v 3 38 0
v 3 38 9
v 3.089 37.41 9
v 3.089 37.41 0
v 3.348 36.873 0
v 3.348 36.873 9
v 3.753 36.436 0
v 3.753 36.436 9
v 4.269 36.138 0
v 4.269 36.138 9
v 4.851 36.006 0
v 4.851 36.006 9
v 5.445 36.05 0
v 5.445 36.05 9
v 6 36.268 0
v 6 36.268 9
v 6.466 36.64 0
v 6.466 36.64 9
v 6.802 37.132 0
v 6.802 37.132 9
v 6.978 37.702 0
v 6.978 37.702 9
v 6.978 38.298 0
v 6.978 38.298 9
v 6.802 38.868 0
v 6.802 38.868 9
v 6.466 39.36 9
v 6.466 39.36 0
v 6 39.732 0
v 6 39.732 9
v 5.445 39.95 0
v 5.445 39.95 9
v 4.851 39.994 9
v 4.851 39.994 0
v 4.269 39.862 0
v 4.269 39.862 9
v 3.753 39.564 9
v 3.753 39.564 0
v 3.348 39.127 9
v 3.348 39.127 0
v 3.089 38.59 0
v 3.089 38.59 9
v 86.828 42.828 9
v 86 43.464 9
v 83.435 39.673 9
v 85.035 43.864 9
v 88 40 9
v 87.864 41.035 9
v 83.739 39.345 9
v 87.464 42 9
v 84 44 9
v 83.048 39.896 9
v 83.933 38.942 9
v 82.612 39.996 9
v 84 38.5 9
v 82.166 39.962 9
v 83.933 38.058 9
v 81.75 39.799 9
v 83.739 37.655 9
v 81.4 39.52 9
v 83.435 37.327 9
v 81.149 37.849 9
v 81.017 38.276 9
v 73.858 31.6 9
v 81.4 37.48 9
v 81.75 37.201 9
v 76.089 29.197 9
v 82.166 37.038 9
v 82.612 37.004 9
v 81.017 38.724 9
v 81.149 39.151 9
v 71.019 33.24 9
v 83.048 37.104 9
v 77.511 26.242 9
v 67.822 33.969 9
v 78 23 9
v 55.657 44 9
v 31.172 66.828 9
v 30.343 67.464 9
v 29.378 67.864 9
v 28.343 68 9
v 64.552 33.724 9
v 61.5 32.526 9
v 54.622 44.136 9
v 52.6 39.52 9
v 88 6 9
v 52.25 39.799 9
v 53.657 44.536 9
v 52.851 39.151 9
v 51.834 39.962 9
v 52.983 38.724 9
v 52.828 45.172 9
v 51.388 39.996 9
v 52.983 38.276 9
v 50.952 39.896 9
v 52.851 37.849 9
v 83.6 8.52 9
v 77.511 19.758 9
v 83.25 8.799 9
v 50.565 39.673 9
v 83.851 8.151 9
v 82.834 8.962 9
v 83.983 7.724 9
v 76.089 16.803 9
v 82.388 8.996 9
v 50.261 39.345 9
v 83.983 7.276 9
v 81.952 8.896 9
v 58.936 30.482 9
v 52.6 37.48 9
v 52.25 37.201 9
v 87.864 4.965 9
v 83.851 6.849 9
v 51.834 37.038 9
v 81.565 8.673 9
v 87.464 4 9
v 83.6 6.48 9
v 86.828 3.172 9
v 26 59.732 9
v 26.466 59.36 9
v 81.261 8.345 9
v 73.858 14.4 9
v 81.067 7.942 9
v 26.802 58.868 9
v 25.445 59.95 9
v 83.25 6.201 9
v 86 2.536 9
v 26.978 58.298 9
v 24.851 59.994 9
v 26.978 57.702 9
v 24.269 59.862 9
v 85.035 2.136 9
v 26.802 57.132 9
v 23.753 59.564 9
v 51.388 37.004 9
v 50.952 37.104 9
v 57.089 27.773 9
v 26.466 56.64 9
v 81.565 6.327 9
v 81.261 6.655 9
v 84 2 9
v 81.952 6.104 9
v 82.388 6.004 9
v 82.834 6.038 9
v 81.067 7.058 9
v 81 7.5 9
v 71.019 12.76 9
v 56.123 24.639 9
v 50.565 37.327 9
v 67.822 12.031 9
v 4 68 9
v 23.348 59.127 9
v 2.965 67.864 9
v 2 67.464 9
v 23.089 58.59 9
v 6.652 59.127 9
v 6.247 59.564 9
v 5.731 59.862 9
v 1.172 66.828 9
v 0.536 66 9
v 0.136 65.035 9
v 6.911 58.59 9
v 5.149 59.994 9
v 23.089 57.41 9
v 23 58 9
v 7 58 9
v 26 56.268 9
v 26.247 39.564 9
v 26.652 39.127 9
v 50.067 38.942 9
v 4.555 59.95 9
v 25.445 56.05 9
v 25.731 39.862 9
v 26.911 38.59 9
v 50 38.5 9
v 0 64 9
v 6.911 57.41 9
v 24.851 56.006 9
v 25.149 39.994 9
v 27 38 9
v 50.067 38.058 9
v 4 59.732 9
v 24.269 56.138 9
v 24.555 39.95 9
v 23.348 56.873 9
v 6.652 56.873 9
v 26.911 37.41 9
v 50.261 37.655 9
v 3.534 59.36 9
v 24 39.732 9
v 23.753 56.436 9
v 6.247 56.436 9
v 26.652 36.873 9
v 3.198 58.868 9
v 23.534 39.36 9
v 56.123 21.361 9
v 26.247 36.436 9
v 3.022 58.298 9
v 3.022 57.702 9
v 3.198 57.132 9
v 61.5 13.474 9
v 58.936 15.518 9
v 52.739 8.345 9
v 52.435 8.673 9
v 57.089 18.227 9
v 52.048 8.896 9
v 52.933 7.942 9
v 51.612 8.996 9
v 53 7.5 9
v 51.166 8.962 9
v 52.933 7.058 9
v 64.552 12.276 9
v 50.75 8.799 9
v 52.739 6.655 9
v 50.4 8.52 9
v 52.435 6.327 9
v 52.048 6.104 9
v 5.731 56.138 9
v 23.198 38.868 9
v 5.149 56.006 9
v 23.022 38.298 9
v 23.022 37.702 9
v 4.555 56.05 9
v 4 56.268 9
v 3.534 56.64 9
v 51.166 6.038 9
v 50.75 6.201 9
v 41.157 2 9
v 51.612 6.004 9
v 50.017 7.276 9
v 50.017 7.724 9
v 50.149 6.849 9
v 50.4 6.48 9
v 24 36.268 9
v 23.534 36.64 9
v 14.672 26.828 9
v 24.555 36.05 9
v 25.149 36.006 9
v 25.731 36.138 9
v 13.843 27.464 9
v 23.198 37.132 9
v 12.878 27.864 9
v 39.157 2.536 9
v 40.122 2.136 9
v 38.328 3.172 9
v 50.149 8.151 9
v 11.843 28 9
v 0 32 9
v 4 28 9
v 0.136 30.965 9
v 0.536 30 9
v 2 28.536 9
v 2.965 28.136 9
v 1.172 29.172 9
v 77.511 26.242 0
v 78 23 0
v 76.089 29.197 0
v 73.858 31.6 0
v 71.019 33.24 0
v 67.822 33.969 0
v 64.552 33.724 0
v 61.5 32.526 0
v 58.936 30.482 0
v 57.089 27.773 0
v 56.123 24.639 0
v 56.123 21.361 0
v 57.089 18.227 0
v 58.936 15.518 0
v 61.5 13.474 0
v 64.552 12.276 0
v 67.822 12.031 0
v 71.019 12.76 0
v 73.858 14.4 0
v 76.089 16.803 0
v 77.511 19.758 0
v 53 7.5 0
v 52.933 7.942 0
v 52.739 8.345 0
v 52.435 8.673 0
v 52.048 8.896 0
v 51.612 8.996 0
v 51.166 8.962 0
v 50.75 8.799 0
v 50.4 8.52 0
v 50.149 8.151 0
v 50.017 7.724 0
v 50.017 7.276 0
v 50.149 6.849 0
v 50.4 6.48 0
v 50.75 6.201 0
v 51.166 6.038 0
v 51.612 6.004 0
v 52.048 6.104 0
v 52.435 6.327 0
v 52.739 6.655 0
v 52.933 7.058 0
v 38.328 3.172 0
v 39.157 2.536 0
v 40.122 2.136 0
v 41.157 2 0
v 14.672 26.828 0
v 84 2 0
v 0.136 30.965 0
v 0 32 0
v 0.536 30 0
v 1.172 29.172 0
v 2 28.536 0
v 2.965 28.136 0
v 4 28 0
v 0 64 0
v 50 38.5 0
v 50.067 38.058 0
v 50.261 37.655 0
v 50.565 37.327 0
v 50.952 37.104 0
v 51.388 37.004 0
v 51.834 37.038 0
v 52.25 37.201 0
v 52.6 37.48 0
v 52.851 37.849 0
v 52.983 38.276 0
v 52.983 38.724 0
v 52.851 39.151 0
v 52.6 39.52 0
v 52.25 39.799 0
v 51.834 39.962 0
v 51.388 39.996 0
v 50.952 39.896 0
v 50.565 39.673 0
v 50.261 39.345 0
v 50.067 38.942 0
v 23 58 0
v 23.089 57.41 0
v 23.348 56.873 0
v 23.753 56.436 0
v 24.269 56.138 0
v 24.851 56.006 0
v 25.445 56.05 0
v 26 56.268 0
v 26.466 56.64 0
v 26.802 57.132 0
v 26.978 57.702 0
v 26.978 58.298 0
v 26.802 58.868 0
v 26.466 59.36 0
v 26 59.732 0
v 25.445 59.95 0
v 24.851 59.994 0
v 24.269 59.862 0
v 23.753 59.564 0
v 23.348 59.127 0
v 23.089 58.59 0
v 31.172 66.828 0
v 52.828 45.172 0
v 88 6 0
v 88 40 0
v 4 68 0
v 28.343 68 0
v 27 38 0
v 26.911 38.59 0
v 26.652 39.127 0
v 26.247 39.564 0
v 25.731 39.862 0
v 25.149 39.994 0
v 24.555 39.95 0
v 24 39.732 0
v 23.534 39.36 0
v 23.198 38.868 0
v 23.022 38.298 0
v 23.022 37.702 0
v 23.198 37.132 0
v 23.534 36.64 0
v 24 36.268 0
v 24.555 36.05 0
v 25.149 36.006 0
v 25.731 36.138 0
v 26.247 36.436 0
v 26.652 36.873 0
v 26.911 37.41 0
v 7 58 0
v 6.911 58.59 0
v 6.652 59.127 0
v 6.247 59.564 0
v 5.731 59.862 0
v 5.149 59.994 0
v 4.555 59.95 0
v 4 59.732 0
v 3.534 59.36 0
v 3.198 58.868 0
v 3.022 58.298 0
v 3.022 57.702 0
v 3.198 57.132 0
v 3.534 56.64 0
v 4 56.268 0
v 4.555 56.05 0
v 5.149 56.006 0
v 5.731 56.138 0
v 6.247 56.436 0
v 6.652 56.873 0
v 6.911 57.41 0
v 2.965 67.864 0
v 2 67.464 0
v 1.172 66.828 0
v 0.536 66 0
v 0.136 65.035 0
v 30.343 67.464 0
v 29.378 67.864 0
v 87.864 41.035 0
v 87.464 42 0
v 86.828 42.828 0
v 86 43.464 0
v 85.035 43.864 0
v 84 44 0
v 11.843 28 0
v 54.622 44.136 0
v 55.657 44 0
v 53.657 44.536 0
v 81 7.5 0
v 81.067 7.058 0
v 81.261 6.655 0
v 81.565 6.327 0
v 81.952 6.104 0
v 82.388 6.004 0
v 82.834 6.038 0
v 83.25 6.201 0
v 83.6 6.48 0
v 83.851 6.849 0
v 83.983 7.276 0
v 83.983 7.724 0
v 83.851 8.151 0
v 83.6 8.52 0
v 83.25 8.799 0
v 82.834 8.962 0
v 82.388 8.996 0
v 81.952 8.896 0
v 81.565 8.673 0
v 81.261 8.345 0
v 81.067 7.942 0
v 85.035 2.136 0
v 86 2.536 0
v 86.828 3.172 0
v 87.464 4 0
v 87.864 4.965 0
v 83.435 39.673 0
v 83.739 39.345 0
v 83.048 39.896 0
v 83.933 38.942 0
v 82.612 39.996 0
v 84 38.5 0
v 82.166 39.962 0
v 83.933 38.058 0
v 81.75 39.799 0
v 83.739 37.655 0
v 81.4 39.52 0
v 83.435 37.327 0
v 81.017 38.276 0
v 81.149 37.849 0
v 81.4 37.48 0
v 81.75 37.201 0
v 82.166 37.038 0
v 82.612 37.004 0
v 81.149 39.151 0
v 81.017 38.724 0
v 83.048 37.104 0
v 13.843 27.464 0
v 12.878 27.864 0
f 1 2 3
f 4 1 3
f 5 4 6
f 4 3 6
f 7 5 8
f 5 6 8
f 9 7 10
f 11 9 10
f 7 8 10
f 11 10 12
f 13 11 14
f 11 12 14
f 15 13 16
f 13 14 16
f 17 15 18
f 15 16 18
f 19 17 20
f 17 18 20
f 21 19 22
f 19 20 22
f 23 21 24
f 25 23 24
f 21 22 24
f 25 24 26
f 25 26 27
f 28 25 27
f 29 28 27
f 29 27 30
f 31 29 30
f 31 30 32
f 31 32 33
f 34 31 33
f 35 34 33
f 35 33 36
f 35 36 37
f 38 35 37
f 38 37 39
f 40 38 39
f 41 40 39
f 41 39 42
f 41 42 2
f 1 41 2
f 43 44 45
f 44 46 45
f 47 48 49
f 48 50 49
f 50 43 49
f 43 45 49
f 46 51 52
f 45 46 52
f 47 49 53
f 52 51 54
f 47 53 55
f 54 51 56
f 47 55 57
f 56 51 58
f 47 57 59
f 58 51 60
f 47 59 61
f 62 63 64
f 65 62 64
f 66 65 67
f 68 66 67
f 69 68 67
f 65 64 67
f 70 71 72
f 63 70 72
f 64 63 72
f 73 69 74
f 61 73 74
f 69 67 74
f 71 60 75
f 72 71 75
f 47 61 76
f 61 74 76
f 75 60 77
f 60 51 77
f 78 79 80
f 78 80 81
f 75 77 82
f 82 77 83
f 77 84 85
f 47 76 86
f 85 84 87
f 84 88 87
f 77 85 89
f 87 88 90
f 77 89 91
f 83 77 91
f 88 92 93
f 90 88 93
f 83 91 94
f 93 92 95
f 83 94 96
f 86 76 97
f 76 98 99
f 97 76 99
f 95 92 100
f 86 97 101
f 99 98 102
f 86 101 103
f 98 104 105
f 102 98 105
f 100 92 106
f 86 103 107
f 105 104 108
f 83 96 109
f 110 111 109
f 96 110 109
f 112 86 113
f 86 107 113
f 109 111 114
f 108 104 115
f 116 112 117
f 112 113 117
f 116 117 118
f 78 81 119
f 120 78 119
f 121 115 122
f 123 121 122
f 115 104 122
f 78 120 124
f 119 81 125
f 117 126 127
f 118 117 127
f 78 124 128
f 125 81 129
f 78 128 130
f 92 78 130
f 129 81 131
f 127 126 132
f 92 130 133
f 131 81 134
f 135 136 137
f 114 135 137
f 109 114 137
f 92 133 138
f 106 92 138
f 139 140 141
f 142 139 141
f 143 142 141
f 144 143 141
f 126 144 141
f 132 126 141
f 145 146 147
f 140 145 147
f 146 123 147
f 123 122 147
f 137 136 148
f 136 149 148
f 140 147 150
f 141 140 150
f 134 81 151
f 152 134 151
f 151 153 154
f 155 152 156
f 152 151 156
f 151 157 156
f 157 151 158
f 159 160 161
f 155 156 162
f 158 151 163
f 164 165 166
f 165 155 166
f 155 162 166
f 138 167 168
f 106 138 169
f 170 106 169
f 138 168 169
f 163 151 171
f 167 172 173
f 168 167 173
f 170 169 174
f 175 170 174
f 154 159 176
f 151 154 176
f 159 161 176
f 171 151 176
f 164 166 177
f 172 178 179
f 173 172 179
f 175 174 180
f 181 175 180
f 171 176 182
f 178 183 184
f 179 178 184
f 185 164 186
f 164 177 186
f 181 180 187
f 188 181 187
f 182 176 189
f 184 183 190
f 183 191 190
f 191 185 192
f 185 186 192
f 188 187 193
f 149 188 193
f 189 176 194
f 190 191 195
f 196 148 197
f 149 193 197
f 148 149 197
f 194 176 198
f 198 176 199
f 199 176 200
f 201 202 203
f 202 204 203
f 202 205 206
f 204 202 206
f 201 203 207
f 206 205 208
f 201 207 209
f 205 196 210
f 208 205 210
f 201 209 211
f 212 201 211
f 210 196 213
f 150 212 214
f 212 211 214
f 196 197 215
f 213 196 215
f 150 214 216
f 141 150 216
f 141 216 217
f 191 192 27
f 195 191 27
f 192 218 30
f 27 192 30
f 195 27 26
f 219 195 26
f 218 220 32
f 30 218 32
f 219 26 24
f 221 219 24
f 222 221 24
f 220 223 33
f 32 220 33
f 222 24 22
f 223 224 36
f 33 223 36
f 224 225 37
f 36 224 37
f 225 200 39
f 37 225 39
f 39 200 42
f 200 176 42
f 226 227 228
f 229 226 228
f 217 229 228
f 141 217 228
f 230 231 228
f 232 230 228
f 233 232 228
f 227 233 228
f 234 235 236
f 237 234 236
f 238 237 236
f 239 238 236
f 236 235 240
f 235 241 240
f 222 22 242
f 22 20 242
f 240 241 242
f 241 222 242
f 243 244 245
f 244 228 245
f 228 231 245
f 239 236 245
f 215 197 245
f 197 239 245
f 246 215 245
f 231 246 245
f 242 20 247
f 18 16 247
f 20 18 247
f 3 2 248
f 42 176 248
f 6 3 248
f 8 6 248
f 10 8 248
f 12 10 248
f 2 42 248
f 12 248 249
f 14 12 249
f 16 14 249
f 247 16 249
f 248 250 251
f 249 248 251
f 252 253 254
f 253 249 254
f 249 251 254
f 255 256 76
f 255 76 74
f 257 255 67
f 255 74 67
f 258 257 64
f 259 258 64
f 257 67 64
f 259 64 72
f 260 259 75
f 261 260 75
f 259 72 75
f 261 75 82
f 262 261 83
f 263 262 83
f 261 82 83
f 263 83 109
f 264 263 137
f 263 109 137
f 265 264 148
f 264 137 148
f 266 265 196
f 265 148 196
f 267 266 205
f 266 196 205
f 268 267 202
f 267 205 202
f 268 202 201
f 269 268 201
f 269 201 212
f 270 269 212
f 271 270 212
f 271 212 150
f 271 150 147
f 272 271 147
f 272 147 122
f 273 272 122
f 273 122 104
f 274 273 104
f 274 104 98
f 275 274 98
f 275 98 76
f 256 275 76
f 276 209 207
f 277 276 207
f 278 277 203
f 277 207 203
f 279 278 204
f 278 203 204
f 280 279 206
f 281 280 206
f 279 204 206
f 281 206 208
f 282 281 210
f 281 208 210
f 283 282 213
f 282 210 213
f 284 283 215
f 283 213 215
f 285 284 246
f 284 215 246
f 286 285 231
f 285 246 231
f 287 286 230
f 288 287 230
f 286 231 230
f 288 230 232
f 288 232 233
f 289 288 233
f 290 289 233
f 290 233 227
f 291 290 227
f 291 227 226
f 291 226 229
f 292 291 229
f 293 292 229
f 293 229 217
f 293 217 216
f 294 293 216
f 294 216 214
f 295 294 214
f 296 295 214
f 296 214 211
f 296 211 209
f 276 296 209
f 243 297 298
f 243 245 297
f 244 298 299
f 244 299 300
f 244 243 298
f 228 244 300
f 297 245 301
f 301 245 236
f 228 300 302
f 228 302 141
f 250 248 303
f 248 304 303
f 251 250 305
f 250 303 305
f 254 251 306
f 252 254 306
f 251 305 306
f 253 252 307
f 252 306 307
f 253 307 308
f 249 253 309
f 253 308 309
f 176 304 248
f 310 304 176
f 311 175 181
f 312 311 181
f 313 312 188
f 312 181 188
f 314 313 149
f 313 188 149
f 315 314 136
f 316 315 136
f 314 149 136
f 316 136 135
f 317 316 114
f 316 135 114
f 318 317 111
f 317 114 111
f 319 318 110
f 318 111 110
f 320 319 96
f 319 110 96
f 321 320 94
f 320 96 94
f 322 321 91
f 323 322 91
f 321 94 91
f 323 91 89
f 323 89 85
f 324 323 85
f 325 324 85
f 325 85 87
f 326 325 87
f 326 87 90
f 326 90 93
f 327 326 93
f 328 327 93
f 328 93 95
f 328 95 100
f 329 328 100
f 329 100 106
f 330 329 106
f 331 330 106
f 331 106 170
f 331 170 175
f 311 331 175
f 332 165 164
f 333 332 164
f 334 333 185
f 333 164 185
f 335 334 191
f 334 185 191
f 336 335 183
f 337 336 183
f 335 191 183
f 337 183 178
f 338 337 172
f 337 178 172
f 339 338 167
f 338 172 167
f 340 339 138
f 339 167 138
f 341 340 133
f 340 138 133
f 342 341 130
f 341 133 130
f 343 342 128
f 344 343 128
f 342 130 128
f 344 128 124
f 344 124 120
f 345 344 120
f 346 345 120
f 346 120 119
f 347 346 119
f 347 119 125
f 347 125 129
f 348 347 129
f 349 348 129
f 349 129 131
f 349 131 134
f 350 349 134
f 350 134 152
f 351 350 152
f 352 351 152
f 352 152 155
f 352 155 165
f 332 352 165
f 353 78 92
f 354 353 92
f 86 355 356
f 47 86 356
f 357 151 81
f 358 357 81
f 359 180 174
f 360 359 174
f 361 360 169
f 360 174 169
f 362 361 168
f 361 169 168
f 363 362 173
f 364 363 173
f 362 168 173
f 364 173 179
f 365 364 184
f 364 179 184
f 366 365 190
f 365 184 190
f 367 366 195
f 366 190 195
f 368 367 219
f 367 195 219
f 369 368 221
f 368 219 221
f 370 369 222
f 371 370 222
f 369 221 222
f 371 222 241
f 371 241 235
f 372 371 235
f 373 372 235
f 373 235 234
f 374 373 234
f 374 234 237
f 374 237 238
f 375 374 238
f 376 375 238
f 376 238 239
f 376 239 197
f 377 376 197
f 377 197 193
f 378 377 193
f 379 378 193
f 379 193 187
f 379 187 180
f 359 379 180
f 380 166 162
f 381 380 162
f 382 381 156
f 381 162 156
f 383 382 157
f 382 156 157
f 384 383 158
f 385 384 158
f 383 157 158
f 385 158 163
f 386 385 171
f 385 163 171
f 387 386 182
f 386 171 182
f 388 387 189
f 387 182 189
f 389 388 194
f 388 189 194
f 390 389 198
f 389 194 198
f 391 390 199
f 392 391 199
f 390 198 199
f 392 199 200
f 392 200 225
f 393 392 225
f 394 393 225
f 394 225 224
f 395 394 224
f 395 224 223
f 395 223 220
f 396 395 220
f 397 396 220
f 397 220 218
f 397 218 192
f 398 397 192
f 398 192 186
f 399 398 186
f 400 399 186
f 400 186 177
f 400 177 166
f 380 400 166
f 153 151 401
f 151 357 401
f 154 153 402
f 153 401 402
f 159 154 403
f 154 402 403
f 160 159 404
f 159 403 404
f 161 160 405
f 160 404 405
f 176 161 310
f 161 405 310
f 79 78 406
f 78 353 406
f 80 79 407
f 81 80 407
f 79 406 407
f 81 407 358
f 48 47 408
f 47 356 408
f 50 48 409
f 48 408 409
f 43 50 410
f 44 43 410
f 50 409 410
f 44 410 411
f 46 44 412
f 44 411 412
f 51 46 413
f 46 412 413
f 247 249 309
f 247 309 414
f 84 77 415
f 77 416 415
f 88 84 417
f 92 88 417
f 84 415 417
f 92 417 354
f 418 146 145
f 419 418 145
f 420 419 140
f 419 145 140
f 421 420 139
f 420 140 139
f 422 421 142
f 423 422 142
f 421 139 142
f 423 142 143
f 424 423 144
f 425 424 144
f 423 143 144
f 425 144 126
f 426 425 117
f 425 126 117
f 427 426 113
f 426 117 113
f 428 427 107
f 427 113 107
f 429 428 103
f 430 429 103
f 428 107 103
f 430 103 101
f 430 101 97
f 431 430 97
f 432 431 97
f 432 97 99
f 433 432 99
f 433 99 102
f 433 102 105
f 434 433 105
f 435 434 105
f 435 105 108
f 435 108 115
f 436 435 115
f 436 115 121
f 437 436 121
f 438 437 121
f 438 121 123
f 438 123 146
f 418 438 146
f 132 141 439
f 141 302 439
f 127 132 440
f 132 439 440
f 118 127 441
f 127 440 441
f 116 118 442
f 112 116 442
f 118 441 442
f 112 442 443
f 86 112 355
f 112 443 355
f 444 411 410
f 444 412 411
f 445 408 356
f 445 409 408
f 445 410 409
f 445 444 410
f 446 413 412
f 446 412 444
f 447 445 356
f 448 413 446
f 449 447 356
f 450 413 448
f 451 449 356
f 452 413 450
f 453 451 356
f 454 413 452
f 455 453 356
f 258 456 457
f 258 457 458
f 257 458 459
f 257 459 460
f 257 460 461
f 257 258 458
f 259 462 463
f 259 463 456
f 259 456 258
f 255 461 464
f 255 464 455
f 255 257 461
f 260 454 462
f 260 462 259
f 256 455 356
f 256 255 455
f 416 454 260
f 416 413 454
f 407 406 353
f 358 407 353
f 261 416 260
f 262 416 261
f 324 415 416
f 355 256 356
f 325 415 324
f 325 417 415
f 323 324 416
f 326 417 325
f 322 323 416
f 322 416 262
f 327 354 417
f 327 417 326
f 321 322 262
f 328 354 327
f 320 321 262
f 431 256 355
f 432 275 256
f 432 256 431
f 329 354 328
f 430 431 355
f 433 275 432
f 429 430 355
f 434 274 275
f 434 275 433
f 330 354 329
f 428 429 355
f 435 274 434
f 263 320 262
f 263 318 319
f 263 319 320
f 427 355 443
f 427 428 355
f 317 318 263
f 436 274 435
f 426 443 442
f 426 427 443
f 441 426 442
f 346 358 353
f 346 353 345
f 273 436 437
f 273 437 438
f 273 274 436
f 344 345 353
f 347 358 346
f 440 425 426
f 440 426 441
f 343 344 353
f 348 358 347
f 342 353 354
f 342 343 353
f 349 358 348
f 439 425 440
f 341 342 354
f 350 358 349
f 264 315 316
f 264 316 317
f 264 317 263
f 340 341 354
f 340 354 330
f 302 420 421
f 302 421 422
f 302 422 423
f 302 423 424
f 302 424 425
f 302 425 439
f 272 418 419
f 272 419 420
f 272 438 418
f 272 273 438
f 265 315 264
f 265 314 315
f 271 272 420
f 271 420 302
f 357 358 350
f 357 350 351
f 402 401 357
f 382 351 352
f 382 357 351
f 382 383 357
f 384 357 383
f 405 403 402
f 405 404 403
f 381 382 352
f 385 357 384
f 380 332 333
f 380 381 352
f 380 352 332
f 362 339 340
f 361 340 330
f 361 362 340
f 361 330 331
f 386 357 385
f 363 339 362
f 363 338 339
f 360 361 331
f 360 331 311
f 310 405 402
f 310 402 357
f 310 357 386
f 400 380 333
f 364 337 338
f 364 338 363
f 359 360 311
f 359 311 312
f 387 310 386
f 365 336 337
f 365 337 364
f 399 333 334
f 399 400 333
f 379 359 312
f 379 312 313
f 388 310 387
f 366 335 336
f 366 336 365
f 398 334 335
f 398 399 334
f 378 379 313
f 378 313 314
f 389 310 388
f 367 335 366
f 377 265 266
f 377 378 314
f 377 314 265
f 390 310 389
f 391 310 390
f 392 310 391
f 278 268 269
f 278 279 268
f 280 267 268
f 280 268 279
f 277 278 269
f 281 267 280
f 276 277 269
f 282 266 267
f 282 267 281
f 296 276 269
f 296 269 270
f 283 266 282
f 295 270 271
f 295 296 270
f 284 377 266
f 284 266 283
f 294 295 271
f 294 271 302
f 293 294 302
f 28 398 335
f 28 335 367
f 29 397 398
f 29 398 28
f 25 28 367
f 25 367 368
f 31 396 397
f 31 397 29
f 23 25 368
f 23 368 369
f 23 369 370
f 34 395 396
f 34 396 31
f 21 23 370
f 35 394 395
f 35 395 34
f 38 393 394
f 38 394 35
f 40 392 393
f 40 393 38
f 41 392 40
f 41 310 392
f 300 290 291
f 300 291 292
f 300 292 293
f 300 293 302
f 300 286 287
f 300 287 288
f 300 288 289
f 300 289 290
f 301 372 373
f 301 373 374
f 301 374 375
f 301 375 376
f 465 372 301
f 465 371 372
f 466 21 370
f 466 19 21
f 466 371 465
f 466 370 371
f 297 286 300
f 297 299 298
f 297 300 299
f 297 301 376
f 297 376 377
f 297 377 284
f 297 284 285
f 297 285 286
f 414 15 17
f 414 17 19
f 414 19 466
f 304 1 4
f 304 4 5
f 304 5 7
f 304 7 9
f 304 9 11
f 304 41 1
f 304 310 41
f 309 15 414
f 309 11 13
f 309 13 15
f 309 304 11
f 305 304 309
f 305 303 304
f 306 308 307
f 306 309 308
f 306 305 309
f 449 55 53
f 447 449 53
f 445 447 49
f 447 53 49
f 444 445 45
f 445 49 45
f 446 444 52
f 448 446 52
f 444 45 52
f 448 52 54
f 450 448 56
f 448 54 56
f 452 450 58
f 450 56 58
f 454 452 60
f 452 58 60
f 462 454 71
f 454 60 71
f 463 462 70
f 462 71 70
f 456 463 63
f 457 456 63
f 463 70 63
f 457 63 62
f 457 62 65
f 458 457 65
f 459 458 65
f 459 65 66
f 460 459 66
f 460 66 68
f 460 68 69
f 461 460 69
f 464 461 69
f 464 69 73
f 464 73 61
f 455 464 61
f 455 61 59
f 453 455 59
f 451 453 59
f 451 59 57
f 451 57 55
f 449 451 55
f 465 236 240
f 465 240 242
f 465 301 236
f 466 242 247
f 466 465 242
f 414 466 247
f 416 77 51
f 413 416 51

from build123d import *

# Parameters (mm, degrees)
ESQUISSE1_W             = 88
ESQUISSE1_H             = 96
BOSS_EXTRU_1_DEPTH      = 9
ESQUISSE2_R             = 2
ENL_V_MAT_EXTRU_1_DEPTH = 131.541181242
ESQUISSE3_R             = 1.5
ESQUISSE3_R_2           = 11
ENL_V_MAT_EXTRU_2_DEPTH = 131.541181242
ESQUISSE4_W             = 88
ESQUISSE4_H             = 28
ENL_V_MAT_EXTRU_3_DEPTH = 131.541181242
ENL_V_MAT_EXTRU_4_DEPTH = 9
ESQUISSE6_W             = 41.5
ESQUISSE6_H             = 28
ENL_V_MAT_EXTRU_5_DEPTH = 112.575086825
ESQUISSE7_W             = 46.5
ESQUISSE7_H             = 2
ENL_V_MAT_EXTRU_6_DEPTH = 112.575086825
CHANFREIN1_SIZE         = 28
CONG_1_R                = 4


with BuildPart() as part:
    # Esquisse1 → Boss.-Extru.1 (new body)
    with BuildSketch(Plane.XY):
        with Locations((44, 48)):
            Rectangle(ESQUISSE1_W, ESQUISSE1_H)
    extrude(amount=BOSS_EXTRU_1_DEPTH)

    # Esquisse2 → Enlèv. mat.-Extru.1 (cut, through all)
    with BuildSketch(Plane.XY.offset(9)):
        with Locations((5, 58)):
            Circle(ESQUISSE2_R)
        with Locations(Location((5, 38, 0), (0, 0, 180))):
            Circle(ESQUISSE2_R)
        with Locations((25, 38)):
            Circle(ESQUISSE2_R)
        with Locations(Location((25, 58, 0), (0, 0, 180))):
            Circle(ESQUISSE2_R)
    extrude(amount=-ENL_V_MAT_EXTRU_1_DEPTH, mode=Mode.SUBTRACT)

    # Esquisse3 → Enlèv. mat.-Extru.2 (cut, through all)
    with BuildSketch(Plane.XY.offset(9)):
        with Locations((82.5, 38.5)):
            Circle(ESQUISSE3_R)
        with Locations(Location((82.5, 7.5, 0), (0, 0, 180))):
            Circle(ESQUISSE3_R)
        with Locations((51.5, 7.5)):
            Circle(ESQUISSE3_R)
        with Locations(Location((51.5, 38.5, 0), (0, 0, 180))):
            Circle(ESQUISSE3_R)
        with Locations((67, 23)):
            Circle(ESQUISSE3_R_2)
    extrude(amount=-ENL_V_MAT_EXTRU_2_DEPTH, mode=Mode.SUBTRACT)

    # Esquisse4 → Enlèv. mat.-Extru.3 (cut, through all)
    with BuildSketch(Plane.XY.offset(9)):
        with Locations((44, 82)):
            Rectangle(ESQUISSE4_W, ESQUISSE4_H)
    extrude(amount=-ENL_V_MAT_EXTRU_3_DEPTH, mode=Mode.SUBTRACT)

    # Esquisse5 → Enlèv. mat.-Extru.4 (cut)
    with BuildSketch(Plane.XY.offset(9)):
        Polygon((30, 68), (54, 44), (88, 44), (88, 68), align=None)
    extrude(amount=-ENL_V_MAT_EXTRU_4_DEPTH, mode=Mode.SUBTRACT)

    # Esquisse6 → Enlèv. mat.-Extru.5 (cut, through all)
    with BuildSketch(Plane.XY.offset(9)):
        with Locations((20.75, 14)):
            Rectangle(ESQUISSE6_W, ESQUISSE6_H)
    extrude(amount=-ENL_V_MAT_EXTRU_5_DEPTH, mode=Mode.SUBTRACT)

    # Esquisse7 → Enlèv. mat.-Extru.6 (cut, through all)
    with BuildSketch(Plane.XY.offset(9)):
        with Locations((64.75, 1)):
            Rectangle(ESQUISSE7_W, ESQUISSE7_H)
    extrude(amount=-ENL_V_MAT_EXTRU_6_DEPTH, mode=Mode.SUBTRACT)

    # Chanfrein1
    # the kernel refuses this chamfer: 28 mm, written as the material it adds along each edge
    with BuildSketch(Plane(origin=(41.5, 28, 9), x_dir=(0.027495876610586358, -0.9996219169112968, 0), z_dir=(0, 0, -1))) as chanfrein1_piece_1_section:
        Polygon((CHANFREIN1_SIZE * 0.999621916911, CHANFREIN1_SIZE * 0.0274958766106), (-CHANFREIN1_SIZE * 0.0274958766106, CHANFREIN1_SIZE * 0.999621916911), (0, 0), align=None)
    chanfrein1_piece_1 = extrude(amount=9, mode=Mode.PRIVATE)
    chanfrein1_piece_1 = split(chanfrein1_piece_1, bisect_by=Plane(origin=(32.152400719, 2, 4.5), z_dir=(0, 1, 0)), keep=Keep.TOP, mode=Mode.PRIVATE)
    add(chanfrein1_piece_1)

    # Congé1
    cong_1_edges = [part.edges().sort_by_distance(p)[0] for p in [
        (88, 2, 4.5),
        (13.5, 28, 4.5),
        (39.5, 2, 4.5),
        (0, 68, 4.5),
        (30, 68, 4.5),
        (88, 44, 4.5),
        (54, 44, 4.5),
        (0, 28, 4.5),
    ]]
    fillet(cong_1_edges, radius=CONG_1_R)


solid = part.part
